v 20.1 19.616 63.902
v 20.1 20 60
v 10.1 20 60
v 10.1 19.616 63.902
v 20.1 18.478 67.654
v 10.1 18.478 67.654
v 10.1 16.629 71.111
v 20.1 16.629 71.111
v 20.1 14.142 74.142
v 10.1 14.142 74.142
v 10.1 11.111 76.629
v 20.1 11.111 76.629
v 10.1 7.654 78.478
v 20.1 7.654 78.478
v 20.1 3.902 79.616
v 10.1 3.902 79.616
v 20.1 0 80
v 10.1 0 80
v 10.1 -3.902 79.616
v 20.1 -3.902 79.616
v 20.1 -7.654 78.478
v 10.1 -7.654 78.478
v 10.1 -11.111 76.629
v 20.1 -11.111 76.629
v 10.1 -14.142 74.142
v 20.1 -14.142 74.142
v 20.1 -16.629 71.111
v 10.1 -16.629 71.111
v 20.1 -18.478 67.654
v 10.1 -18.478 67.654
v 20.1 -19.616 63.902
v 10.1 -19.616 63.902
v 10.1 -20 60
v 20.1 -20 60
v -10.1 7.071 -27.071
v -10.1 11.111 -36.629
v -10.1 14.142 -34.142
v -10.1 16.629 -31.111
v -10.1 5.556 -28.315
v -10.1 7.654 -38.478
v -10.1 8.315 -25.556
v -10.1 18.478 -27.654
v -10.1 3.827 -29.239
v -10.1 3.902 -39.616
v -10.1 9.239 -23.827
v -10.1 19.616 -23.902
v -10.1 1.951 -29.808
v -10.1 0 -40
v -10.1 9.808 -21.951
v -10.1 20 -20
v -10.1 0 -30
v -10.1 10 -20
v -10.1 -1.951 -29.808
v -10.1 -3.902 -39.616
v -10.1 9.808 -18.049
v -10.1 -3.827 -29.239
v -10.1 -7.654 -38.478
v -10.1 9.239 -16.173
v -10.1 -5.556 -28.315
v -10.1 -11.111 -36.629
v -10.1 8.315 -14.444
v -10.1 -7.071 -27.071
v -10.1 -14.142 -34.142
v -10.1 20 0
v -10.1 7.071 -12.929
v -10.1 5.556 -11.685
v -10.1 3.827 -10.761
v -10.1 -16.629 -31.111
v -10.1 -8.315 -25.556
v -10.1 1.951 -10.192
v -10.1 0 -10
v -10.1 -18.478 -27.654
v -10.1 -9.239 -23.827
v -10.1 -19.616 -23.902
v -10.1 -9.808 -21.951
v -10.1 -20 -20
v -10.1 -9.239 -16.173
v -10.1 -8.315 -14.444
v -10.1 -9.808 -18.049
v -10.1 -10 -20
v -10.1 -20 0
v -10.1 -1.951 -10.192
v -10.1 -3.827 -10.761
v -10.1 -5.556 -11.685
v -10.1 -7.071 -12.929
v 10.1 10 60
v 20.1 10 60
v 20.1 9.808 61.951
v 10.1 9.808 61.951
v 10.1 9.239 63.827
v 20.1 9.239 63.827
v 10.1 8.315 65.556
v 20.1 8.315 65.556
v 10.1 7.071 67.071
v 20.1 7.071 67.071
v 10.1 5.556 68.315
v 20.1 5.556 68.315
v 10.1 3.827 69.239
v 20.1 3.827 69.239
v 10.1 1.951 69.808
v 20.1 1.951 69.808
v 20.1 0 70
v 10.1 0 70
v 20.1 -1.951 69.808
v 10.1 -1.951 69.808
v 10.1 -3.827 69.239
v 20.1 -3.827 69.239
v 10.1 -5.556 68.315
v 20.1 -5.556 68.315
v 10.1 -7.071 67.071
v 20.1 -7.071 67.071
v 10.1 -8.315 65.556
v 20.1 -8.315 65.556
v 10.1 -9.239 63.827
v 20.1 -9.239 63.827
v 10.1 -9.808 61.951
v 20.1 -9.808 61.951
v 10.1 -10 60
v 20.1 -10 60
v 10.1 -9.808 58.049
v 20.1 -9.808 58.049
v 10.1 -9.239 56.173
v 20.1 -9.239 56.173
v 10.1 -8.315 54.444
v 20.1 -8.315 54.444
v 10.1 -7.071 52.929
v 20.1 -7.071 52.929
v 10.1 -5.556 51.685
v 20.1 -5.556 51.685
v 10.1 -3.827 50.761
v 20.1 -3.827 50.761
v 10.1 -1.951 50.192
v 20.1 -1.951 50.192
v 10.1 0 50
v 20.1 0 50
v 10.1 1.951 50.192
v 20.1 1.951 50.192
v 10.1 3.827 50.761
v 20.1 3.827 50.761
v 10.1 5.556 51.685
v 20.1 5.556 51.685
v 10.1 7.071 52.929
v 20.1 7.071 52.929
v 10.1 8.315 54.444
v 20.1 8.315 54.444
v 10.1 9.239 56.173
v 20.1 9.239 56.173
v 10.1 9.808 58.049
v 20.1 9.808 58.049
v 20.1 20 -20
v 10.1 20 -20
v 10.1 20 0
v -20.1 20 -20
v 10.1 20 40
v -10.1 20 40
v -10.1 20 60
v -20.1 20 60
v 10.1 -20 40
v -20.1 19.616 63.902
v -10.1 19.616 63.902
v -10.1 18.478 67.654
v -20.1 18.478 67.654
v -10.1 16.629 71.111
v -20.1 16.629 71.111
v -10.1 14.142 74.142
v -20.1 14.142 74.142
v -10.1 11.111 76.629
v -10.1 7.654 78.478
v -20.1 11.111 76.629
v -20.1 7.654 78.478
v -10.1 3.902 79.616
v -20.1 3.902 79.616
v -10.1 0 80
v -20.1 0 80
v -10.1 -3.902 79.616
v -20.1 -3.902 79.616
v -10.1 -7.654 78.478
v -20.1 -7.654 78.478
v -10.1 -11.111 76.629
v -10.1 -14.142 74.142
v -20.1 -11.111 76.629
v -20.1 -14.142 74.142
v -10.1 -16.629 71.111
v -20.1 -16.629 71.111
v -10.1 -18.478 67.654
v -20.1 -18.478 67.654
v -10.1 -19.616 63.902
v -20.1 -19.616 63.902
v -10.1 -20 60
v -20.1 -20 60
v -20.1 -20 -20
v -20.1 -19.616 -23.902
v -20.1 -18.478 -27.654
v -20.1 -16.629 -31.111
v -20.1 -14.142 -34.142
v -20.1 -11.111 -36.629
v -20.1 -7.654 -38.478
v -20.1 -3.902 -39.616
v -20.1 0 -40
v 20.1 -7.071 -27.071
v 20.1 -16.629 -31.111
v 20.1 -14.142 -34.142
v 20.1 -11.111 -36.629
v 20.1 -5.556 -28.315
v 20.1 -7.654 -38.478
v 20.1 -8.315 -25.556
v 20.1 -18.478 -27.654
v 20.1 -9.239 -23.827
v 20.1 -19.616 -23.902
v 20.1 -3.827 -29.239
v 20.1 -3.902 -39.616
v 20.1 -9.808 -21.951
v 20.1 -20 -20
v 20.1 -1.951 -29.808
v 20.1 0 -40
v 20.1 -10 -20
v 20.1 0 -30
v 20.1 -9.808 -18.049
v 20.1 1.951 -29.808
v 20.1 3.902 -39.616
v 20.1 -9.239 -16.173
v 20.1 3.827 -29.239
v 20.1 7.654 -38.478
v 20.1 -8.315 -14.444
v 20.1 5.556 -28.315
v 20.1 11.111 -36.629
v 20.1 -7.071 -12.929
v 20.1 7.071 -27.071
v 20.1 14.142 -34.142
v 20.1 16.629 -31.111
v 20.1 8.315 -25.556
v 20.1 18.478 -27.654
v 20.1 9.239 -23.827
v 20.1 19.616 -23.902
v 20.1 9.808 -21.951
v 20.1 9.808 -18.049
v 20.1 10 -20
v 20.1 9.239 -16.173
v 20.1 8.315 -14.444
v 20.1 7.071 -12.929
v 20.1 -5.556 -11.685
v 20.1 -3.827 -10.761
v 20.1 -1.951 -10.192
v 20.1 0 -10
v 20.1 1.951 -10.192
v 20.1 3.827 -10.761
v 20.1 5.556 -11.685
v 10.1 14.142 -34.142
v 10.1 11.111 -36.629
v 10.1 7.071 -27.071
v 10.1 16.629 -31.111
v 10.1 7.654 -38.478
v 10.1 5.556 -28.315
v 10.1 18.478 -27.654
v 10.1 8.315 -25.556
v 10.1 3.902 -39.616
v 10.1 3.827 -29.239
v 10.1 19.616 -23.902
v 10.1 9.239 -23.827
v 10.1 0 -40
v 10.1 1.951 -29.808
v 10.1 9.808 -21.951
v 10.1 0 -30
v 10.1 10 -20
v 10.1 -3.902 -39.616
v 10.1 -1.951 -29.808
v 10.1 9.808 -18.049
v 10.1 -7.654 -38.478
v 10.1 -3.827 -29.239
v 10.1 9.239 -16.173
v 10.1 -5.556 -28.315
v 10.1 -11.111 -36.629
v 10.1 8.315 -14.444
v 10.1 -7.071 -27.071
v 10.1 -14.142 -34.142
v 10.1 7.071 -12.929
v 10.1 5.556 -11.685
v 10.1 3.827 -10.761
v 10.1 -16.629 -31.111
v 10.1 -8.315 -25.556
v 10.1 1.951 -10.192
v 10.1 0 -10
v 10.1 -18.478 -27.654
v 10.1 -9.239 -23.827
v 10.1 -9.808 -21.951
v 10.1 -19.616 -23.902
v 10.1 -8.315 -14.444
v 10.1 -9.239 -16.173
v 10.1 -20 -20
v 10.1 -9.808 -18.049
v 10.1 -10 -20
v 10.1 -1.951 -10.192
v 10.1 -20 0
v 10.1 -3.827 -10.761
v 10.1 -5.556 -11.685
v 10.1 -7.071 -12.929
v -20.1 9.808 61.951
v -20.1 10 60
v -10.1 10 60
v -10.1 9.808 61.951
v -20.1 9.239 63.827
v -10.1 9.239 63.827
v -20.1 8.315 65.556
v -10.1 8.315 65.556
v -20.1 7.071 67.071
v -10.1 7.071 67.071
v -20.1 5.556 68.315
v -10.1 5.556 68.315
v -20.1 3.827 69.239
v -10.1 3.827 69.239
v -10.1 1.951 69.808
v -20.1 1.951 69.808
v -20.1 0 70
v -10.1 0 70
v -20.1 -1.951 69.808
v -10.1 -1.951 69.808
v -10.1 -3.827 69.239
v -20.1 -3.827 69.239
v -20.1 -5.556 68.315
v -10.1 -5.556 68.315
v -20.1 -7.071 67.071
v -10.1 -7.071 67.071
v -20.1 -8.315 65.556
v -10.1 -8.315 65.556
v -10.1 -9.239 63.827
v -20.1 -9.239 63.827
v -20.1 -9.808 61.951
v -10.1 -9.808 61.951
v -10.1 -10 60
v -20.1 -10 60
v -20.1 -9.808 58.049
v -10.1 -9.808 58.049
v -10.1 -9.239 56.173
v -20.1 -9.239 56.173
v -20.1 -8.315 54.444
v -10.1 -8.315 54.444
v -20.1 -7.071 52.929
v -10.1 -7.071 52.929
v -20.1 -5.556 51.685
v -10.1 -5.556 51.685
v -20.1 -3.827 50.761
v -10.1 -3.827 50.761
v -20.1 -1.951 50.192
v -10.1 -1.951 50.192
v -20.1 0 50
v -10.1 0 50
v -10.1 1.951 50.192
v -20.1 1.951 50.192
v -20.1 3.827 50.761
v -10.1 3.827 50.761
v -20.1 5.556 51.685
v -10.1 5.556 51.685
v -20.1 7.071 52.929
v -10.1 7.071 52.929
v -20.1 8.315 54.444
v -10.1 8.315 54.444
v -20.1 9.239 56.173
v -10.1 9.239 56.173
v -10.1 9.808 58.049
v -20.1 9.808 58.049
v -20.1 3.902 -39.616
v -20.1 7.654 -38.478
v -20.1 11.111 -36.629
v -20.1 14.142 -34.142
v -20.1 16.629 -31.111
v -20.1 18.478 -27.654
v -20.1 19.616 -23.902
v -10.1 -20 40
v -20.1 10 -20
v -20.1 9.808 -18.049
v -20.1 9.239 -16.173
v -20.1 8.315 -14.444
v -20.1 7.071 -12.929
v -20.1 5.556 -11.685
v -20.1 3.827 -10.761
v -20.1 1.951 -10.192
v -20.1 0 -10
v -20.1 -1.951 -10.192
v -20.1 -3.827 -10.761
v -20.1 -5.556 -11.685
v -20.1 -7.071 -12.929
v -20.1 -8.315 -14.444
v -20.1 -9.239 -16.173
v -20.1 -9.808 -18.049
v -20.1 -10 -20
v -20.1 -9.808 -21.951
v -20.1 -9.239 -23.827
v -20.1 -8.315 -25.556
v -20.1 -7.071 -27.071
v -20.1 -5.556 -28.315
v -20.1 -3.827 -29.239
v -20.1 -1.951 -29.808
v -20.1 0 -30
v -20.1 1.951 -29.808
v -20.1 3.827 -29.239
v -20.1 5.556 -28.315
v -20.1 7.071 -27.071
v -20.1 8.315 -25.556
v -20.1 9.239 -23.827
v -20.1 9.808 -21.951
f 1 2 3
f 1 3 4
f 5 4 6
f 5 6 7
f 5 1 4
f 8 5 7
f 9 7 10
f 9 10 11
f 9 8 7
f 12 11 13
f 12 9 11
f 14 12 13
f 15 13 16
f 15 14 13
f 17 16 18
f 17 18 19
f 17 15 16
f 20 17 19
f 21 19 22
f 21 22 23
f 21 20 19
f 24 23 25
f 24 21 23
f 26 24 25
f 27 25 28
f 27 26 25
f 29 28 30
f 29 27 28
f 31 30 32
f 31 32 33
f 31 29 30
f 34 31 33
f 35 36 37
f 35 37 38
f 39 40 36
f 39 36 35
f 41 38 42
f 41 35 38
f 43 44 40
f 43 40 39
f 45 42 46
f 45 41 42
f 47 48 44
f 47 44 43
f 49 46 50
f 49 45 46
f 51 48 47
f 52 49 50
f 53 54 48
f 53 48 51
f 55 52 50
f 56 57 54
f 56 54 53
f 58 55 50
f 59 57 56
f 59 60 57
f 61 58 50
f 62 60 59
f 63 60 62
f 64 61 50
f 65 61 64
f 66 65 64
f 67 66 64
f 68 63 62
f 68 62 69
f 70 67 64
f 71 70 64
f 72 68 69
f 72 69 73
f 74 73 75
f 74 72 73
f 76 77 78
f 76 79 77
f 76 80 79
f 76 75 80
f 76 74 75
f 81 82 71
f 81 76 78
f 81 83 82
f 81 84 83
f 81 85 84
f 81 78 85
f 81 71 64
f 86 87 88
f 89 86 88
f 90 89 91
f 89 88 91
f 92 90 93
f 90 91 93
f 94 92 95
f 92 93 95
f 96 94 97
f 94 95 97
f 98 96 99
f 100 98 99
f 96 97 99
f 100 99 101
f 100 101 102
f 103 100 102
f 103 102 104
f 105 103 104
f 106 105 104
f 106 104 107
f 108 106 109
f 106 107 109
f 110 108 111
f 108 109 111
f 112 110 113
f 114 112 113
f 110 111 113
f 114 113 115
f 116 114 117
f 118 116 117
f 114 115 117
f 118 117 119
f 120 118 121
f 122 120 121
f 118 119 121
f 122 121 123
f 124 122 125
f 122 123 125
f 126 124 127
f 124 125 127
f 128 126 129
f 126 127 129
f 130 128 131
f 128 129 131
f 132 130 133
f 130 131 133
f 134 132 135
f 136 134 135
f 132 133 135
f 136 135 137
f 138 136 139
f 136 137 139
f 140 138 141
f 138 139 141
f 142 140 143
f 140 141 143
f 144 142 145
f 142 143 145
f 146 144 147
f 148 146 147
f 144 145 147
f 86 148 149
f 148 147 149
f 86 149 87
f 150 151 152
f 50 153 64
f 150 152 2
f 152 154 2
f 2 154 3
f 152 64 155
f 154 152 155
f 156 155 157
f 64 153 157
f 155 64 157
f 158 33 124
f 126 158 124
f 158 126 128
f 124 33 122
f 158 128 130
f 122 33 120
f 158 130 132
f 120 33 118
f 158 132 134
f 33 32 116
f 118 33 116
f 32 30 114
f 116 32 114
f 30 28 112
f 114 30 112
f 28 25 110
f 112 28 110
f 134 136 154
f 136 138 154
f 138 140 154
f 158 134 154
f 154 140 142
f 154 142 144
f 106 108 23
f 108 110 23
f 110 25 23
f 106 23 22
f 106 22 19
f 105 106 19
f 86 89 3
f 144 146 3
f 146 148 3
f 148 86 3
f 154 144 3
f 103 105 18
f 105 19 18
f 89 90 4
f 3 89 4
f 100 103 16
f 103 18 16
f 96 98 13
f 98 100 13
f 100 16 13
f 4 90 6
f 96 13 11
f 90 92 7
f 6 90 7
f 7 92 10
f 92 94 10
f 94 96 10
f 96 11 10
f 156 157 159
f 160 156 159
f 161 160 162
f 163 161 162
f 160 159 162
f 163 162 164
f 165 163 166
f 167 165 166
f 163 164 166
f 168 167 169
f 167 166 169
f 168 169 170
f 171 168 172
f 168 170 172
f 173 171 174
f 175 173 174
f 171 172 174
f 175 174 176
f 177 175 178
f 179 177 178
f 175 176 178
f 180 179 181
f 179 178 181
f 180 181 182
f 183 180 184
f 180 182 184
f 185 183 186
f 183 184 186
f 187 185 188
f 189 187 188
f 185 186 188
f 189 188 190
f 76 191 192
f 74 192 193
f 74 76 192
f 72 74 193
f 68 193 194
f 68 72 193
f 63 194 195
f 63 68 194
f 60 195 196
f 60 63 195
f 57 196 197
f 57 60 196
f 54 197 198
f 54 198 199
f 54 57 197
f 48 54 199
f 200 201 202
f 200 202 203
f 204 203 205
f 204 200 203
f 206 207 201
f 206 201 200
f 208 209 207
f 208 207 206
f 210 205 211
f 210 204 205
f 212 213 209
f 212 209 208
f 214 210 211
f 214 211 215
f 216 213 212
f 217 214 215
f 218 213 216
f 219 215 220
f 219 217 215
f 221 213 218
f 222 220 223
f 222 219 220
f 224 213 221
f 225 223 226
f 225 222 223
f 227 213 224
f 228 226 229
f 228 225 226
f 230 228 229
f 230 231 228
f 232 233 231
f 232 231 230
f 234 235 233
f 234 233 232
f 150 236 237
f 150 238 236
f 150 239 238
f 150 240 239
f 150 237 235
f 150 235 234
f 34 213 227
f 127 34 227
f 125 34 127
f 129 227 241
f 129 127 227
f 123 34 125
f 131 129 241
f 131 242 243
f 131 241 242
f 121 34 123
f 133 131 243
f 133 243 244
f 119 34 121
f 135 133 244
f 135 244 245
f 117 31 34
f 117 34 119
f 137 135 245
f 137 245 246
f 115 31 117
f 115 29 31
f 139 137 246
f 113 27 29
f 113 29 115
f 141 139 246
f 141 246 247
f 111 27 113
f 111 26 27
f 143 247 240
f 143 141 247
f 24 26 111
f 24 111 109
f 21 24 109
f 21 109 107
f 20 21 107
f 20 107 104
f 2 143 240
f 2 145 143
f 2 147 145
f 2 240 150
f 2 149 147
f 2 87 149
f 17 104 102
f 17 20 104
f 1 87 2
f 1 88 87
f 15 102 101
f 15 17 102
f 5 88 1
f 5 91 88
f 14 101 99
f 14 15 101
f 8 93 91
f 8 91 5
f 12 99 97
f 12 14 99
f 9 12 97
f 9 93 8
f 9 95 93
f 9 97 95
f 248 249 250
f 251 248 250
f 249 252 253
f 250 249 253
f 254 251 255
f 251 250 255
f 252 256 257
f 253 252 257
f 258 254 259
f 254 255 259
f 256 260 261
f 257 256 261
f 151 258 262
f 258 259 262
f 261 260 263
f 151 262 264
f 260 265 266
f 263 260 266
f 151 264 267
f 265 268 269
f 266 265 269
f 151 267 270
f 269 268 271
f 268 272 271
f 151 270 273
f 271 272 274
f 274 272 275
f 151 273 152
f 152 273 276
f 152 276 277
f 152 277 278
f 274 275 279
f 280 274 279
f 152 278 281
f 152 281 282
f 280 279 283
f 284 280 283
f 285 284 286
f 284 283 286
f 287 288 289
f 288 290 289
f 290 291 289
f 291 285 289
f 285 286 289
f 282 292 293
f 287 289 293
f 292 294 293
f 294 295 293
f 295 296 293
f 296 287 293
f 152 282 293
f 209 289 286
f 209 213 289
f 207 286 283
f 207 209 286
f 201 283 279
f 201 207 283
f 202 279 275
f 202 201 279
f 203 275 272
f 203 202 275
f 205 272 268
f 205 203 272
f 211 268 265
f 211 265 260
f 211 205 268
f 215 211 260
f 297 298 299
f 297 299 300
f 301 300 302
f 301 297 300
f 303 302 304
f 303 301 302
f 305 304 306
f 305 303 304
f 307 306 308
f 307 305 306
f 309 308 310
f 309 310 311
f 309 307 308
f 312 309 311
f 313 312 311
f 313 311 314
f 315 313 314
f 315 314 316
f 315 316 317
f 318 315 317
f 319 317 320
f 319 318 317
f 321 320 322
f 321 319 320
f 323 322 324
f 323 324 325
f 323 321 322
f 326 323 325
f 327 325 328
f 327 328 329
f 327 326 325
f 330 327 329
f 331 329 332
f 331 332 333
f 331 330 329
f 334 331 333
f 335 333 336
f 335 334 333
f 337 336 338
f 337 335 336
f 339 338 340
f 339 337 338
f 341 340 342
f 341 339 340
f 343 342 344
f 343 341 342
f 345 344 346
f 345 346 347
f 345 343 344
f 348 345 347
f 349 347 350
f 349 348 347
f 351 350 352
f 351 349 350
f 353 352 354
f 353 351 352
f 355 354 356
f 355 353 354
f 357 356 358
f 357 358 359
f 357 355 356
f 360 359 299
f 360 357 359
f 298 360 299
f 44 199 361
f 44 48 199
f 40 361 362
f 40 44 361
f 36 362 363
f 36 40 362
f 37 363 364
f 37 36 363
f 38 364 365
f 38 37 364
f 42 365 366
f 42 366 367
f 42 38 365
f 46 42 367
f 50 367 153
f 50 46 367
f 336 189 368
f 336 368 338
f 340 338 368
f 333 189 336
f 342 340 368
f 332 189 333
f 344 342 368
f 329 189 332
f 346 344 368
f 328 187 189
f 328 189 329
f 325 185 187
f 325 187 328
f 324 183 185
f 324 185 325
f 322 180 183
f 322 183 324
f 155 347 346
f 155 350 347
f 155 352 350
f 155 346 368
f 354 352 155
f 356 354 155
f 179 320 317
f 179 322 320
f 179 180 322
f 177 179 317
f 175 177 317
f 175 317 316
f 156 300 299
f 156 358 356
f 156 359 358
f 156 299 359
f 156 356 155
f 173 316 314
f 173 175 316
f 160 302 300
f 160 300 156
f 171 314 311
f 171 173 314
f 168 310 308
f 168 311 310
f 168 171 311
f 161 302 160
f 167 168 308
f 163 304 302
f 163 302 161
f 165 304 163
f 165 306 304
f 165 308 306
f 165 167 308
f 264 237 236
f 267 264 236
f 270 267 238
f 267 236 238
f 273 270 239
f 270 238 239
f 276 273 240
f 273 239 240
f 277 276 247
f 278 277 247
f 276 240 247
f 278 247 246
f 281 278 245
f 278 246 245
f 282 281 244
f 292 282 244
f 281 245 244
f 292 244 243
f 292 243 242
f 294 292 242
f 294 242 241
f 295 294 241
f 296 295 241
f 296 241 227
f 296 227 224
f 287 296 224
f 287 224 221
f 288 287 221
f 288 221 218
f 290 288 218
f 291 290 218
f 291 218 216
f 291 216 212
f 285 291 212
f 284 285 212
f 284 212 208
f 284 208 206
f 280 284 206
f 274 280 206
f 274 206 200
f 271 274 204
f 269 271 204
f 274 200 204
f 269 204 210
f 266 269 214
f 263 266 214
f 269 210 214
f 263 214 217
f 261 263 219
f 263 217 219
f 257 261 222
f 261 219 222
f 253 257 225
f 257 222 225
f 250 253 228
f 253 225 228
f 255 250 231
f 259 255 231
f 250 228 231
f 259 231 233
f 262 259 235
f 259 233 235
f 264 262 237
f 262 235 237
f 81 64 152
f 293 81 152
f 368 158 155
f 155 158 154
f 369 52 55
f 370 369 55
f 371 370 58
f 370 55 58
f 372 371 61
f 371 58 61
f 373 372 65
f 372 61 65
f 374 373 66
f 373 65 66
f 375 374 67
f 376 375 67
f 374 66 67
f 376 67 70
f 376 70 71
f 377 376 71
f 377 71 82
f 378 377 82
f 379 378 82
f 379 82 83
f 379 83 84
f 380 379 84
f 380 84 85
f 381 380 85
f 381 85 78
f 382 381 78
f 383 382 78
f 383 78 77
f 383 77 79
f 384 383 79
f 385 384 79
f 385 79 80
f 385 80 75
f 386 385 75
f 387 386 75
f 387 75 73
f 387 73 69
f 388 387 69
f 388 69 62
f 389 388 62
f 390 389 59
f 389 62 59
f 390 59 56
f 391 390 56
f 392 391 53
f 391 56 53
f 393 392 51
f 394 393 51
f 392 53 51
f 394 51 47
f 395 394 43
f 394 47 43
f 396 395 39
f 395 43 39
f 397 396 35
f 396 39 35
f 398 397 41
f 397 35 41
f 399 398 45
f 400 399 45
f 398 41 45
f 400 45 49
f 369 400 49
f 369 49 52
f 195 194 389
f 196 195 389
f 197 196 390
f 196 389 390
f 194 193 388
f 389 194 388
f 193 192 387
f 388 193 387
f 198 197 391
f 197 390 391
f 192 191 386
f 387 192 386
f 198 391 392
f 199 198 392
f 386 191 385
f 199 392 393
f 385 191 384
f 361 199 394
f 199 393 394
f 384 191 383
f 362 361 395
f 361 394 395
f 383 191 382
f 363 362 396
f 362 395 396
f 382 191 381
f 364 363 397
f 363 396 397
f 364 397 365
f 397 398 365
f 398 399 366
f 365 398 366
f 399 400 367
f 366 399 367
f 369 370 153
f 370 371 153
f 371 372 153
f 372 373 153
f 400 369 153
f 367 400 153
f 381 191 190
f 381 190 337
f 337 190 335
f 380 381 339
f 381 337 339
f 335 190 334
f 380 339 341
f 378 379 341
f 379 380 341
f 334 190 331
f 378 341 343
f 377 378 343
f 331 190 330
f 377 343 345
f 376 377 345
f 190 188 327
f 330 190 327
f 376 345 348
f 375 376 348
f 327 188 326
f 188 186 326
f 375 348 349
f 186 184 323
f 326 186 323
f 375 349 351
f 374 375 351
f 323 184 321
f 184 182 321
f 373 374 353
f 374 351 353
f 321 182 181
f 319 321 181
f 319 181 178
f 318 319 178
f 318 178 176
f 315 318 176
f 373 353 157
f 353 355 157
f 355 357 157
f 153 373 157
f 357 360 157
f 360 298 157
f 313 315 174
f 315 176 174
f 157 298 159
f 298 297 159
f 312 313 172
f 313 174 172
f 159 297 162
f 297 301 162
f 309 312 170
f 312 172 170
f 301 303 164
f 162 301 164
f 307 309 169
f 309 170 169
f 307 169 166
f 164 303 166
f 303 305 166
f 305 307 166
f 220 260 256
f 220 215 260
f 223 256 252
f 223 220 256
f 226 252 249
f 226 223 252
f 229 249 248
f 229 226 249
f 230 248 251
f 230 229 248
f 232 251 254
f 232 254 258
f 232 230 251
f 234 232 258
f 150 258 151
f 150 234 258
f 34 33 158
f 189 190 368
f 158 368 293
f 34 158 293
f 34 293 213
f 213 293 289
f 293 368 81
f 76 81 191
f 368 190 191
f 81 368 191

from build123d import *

# Parameters (mm, degrees)
F0_W     = 40
F0_H     = 80
F1_DEPTH = 20.1
F2_R     = 10
F3_DEPTH = 10
F5_W     = 20.2
F5_H     = 40
F6_DEPTH = 40
F7_R     = 10
F8_DEPTH = 40.2
F9_R     = 19.99999


# Not quite as in the source:
# - a fillet or chamfer is up to 0.001 mm smaller than in the source, because OpenCascade refuses the exact size


with BuildPart() as f1:
    # F0 (on Right) → F1 (new body)
    with BuildSketch(Plane.YZ):
        Rectangle(F0_W, F0_H)
    extrude(amount=F1_DEPTH)

    # F2 (on face) → F3 (join)
    with BuildSketch(Plane.YZ.offset(20.1)):
        with BuildLine():
            Line((-20, 60), (-20, 40))
            Line((-20, 40), (20, 40))
            Line((20, 40), (20, 60))
            ThreePointArc((20, 60), (0, 80), (-20, 60))
        make_face()
        with Locations((0, 60)):
            Circle(F2_R, mode=Mode.SUBTRACT)
    extrude(amount=-F3_DEPTH)

    # F4: F1 across face


with BuildPart() as f1_1:
    add(f1.part)
    add(f1.part.mirror(Plane(origin=(0, 0, 0), x_dir=(0, 1, 0), z_dir=(-1, 0, 0))))

    # F5 (on face) → F6 (cut, through all)
    with BuildSketch(Plane.XZ.offset(20)):
        with Locations((0, -20)):
            Rectangle(F5_W, F5_H)
    extrude(amount=-F6_DEPTH, mode=Mode.SUBTRACT)

    # F7 (on face) → F8 (cut, through all)
    with BuildSketch(Plane.YZ.offset(20.1)):
        with Locations((0, -20)):
            Circle(F7_R)
    extrude(amount=-F8_DEPTH, mode=Mode.SUBTRACT)

    # F9 (radius 20 in the source; OpenCascade refuses exactly that, so slightly less here)
    f9_edges = [f1_1.edges().sort_by_distance(p)[0] for p in [
        (-15.1, 20, -40),
        (-15.1, -20, -40),
        (15.1, 20, -40),
        (15.1, -20, -40),
    ]]
    fillet(f9_edges, radius=F9_R)


solid = f1_1.part
